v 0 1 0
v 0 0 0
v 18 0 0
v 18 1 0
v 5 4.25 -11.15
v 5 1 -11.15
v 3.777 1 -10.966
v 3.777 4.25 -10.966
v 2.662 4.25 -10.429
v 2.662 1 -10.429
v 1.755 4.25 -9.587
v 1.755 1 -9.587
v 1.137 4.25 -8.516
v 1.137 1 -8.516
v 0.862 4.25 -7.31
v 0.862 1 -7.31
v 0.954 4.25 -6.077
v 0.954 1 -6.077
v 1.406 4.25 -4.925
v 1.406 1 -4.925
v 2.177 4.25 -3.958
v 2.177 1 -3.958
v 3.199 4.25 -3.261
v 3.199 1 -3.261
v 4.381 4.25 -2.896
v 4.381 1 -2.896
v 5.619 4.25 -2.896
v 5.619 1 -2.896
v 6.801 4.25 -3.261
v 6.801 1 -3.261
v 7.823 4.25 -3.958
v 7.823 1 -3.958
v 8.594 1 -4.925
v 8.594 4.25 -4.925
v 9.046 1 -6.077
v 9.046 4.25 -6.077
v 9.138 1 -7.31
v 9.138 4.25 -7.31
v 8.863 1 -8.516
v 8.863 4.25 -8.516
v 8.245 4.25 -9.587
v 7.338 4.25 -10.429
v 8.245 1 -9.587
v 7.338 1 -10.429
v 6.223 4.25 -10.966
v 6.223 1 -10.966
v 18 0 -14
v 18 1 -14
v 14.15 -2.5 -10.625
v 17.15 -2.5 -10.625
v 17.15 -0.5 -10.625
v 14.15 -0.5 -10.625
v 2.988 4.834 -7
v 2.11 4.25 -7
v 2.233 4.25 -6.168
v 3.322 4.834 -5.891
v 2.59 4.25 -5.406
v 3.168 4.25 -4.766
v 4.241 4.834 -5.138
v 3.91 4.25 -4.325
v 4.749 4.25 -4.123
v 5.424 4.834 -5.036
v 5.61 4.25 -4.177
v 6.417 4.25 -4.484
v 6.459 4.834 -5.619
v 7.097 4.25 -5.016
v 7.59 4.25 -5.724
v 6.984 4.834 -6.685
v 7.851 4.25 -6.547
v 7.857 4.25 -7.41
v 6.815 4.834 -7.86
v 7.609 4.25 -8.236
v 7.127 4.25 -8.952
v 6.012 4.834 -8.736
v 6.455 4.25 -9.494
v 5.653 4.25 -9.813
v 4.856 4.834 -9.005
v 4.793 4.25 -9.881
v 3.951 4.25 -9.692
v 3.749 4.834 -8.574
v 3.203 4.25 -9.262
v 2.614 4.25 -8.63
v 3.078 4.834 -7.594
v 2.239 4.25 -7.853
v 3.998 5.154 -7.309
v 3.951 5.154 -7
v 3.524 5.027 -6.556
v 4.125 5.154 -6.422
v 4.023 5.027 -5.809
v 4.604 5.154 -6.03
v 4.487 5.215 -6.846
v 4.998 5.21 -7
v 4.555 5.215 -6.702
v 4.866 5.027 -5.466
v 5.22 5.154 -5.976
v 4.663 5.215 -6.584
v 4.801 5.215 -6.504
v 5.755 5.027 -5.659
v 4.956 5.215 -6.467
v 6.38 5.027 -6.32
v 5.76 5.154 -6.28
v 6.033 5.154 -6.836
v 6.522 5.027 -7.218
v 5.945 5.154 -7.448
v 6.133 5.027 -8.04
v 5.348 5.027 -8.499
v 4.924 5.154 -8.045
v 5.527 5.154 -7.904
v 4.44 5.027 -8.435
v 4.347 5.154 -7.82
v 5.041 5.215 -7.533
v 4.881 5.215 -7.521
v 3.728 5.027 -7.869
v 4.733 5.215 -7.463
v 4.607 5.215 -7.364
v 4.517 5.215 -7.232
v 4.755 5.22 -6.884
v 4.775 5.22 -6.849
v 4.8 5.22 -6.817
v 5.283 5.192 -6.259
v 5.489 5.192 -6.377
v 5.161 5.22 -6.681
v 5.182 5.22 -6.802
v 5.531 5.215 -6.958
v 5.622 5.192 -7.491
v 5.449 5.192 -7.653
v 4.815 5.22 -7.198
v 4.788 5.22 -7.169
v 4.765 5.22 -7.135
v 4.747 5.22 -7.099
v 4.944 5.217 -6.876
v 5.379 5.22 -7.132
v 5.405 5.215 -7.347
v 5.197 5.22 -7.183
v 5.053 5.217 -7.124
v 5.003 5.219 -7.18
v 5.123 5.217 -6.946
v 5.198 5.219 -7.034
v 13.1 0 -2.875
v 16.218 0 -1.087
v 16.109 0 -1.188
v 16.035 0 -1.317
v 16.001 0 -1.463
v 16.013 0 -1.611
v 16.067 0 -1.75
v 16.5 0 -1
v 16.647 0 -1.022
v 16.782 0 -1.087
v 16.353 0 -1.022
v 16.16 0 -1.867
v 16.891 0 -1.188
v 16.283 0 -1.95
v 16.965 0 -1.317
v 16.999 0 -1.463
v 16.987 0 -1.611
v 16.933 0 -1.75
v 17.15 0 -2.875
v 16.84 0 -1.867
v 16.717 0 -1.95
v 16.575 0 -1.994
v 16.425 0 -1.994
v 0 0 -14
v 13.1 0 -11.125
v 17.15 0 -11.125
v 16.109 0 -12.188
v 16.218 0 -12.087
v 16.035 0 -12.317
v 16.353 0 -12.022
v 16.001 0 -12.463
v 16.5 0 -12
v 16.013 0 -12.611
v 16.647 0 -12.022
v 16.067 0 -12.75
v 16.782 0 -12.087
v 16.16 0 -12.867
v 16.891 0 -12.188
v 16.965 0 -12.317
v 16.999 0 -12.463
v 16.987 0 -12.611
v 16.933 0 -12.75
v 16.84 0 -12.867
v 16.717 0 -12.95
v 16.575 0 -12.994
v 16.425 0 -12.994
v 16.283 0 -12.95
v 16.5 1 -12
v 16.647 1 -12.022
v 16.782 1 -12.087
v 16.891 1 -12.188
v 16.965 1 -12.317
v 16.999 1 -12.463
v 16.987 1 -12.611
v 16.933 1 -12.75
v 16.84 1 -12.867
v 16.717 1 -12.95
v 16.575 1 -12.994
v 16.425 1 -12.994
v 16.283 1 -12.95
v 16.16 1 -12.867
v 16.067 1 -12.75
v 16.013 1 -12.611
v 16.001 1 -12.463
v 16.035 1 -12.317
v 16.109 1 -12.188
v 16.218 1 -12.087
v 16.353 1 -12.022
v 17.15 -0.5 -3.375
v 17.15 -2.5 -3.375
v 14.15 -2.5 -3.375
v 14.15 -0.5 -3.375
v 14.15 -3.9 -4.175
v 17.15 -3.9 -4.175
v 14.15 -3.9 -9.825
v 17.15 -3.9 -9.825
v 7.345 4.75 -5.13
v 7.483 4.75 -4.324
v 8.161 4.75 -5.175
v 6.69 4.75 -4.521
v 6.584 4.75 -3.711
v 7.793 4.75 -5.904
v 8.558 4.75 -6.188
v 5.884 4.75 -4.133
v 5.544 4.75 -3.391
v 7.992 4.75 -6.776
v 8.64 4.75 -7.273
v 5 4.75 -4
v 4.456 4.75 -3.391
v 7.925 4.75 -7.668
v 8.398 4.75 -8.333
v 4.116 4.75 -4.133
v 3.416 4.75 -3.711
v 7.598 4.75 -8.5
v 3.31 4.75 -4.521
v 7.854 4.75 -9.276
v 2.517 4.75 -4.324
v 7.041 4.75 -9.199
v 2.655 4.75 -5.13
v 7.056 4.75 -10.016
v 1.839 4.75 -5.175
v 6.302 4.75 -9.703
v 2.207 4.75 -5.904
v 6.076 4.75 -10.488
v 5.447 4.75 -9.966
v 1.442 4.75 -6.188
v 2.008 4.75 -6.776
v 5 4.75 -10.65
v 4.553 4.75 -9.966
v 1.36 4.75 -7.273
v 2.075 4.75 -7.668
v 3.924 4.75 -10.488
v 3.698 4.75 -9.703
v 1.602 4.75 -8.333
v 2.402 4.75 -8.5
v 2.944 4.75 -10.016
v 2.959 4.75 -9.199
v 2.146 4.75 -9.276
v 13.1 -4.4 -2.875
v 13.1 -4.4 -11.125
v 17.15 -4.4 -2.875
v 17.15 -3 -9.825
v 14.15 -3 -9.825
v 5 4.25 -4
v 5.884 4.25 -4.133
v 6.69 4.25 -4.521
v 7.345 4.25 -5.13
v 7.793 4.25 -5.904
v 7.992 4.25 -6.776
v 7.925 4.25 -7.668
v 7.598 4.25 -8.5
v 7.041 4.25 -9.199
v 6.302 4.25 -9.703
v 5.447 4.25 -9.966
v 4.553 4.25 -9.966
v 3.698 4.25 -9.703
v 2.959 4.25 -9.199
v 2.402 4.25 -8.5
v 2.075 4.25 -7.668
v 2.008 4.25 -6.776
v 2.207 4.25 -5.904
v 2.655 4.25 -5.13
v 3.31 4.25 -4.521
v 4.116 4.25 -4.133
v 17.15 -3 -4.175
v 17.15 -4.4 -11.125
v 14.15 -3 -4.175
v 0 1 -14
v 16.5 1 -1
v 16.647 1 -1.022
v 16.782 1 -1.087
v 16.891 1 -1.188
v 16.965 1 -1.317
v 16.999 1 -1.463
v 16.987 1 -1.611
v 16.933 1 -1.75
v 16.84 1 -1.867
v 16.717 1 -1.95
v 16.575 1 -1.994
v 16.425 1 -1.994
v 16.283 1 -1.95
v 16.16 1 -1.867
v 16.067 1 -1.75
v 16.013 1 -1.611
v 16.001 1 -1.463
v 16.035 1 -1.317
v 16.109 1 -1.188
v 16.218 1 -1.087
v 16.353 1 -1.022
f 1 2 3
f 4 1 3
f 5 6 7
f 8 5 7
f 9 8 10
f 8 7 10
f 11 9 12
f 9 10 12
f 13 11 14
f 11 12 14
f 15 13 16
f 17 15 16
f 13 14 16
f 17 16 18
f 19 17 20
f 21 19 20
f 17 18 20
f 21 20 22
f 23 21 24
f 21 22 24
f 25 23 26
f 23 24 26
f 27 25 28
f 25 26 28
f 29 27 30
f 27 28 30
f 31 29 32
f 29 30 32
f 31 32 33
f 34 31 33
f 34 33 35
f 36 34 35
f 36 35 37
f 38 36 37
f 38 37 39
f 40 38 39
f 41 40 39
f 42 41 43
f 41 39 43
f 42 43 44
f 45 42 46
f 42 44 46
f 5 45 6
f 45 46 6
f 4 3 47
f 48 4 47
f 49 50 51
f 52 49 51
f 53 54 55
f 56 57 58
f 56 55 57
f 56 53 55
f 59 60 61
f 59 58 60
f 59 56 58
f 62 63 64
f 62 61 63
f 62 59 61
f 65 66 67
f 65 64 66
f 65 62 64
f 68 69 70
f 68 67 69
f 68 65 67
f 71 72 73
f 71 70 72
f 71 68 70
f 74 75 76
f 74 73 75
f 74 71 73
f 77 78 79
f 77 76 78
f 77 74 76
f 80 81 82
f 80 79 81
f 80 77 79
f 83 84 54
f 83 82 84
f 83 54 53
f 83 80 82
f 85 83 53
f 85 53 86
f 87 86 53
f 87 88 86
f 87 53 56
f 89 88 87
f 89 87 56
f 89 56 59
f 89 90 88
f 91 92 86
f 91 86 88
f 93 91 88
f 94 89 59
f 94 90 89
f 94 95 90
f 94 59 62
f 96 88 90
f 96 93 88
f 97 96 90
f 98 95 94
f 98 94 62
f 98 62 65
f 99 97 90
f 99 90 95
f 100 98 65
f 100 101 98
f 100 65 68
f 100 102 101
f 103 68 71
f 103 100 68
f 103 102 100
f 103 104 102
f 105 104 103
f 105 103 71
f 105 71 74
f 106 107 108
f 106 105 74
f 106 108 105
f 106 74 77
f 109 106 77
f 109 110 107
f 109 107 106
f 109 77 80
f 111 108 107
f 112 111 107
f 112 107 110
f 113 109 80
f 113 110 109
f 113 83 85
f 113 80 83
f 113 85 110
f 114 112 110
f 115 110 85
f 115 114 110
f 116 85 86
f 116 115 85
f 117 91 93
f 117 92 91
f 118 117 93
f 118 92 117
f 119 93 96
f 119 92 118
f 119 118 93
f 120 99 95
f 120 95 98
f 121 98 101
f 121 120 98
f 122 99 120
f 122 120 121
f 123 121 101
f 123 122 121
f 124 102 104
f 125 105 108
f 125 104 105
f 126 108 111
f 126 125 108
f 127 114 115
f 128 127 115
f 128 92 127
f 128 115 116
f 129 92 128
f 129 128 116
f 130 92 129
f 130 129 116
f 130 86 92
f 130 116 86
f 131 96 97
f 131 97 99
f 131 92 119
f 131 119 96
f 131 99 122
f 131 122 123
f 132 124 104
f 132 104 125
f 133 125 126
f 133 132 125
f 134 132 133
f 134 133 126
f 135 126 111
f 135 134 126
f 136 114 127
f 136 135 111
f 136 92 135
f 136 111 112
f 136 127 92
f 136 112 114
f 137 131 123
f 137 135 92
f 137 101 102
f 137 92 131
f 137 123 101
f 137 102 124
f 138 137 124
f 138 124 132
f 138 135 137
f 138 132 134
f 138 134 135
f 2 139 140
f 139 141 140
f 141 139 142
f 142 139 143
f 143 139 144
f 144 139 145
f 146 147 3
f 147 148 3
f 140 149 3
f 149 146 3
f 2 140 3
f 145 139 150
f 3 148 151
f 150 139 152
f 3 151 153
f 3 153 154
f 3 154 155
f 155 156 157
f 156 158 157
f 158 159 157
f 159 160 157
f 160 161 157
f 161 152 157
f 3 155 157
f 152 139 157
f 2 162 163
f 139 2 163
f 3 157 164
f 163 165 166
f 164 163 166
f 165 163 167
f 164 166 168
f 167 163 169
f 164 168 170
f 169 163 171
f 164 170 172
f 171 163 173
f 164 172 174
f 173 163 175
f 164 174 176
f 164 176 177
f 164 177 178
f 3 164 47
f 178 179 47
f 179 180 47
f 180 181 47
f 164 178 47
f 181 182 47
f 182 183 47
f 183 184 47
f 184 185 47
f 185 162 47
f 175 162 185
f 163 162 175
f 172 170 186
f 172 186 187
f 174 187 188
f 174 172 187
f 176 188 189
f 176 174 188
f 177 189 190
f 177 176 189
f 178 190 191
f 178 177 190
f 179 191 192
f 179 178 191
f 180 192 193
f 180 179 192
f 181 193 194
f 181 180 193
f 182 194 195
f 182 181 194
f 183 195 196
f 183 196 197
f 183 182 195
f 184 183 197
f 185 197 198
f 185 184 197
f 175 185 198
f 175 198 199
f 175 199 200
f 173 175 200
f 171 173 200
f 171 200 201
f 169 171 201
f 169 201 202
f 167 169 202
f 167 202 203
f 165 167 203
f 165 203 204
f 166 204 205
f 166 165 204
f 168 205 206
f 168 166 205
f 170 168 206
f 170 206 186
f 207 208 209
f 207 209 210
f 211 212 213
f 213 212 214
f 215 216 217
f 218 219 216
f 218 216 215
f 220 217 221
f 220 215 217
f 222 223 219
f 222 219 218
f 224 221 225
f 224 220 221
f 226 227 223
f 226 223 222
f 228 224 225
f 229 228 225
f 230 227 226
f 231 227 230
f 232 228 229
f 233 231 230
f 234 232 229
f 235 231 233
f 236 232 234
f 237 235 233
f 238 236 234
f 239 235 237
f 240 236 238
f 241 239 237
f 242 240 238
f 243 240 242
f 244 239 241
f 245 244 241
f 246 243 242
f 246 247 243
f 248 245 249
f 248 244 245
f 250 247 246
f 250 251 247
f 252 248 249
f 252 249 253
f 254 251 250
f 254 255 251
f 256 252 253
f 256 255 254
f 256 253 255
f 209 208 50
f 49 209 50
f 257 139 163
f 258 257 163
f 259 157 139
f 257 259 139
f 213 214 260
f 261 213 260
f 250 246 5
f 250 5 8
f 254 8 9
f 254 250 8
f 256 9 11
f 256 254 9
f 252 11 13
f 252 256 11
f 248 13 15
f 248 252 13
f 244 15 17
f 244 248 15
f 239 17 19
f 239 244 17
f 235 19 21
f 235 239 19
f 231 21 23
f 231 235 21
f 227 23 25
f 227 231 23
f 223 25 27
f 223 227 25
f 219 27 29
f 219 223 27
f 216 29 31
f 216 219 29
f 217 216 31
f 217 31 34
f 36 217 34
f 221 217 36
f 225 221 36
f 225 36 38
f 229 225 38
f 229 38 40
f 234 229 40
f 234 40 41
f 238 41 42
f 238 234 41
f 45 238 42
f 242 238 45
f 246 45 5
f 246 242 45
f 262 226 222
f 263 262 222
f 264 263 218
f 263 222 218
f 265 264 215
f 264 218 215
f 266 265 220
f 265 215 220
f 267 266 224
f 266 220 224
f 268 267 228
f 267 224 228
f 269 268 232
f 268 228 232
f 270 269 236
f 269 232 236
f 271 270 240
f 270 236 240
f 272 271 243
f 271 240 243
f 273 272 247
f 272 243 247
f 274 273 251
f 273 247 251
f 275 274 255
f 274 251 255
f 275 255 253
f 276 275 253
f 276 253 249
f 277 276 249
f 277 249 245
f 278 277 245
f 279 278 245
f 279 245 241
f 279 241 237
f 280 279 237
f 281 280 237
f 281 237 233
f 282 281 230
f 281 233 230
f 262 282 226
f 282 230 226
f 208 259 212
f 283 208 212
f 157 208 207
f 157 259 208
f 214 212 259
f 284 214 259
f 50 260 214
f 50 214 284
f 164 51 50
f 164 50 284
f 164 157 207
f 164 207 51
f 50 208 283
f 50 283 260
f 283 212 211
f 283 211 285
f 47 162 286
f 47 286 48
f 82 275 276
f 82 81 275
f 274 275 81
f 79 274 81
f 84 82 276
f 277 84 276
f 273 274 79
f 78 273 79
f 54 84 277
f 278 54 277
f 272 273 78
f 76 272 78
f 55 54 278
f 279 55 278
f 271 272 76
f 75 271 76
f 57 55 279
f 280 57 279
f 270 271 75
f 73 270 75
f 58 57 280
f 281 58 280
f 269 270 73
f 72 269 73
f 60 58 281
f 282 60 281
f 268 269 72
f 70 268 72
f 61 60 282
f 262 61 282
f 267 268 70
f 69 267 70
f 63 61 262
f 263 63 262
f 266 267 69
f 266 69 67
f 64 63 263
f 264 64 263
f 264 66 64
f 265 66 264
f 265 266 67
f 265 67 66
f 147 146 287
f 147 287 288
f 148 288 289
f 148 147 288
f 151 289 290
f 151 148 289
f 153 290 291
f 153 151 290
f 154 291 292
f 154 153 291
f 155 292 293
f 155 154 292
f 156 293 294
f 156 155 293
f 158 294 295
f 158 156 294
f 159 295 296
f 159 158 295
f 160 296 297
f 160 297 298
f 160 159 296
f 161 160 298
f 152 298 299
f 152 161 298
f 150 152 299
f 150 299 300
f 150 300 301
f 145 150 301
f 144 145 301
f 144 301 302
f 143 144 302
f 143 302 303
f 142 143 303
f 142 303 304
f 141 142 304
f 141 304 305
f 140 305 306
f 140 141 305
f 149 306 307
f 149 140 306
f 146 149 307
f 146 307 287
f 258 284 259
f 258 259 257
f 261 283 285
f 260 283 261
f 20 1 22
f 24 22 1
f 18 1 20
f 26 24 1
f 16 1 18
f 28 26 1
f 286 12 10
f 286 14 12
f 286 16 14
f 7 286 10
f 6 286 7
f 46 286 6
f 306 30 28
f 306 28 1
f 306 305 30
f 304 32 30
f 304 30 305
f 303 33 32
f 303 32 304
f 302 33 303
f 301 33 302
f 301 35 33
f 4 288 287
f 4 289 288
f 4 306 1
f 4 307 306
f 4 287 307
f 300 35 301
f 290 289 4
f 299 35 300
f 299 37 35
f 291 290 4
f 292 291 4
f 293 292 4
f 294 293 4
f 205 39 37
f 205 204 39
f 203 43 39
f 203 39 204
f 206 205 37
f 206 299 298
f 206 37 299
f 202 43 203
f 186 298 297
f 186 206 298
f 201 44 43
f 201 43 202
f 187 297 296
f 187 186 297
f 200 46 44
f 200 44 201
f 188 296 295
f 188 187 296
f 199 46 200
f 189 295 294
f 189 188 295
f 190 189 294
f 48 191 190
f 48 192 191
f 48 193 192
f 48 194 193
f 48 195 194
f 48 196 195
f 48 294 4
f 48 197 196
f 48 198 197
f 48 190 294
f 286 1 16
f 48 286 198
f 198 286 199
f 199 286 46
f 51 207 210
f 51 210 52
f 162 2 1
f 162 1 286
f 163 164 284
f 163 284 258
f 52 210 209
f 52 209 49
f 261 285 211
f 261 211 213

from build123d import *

# Parameters (mm, degrees)
SKETCH1_W           = 18
SKETCH1_H           = 14
SKETCH1_R           = 0.5
BOSS_EXTRUDE1_DEPTH = 1
SKETCH2_R           = 4.15
BOSS_EXTRUDE2_DEPTH = 3.75
SKETCH3_W           = 4.05
SKETCH3_H           = 8.25
BOSS_EXTRUDE3_DEPTH = 4.4
SKETCH4_W           = 7.25
SKETCH4_H           = 2
SKETCH4_W_2         = 5.65
SKETCH4_H_2         = 0.9
CUT_EXTRUDE1_DEPTH  = 3
SKETCH5_R           = 3
CUT_EXTRUDE2_DEPTH  = 0.5
CHAMFER1_SIZE       = 0.5


with BuildPart() as part:
    # Sketch1 → Boss-Extrude1 (new body)
    with BuildSketch(Plane(origin=(0, 0, 0), x_dir=(1, 0, 0), z_dir=(0, 1, 0))):
        with Locations((9, 7)):
            Rectangle(SKETCH1_W, SKETCH1_H)
        with Locations(Location((16.5, 12.5, 0), (0, 0, 270))):
            Circle(SKETCH1_R, mode=Mode.SUBTRACT)
        with Locations(Location((16.5, 1.5, 0), (0, 0, 270))):
            Circle(SKETCH1_R, mode=Mode.SUBTRACT)
    extrude(amount=BOSS_EXTRUDE1_DEPTH)

    # Sketch2 → Boss-Extrude2 (add)
    with BuildSketch(Plane(origin=(0, 1, 0), x_dir=(1, 0, 0), z_dir=(0, 1, 0))):
        with Locations(Location((5, 7, 0), (0, 0, 90))):
            Circle(SKETCH2_R)
    extrude(amount=BOSS_EXTRUDE2_DEPTH)

    # Sketch3 → Boss-Extrude3 (add)
    with BuildSketch(Plane(origin=(0, 0, 0), x_dir=(-1, 0, 0), z_dir=(0, -1, 0))):
        with Locations((-15.125, 7)):
            Rectangle(SKETCH3_W, SKETCH3_H)
    extrude(amount=BOSS_EXTRUDE3_DEPTH)

    # Sketch4 → Cut-Extrude1 (cut)
    with BuildSketch(Plane(origin=(17.15, 0, 0), x_dir=(0, 0, -1), z_dir=(1, 0, 0))):
        with Locations((7, -1.5)):
            Rectangle(SKETCH4_W, SKETCH4_H)
        with Locations((7, -3.45)):
            Rectangle(SKETCH4_W_2, SKETCH4_H_2)
    extrude(amount=-CUT_EXTRUDE1_DEPTH, mode=Mode.SUBTRACT)

    # Sketch5 → Cut-Extrude2 (cut)
    with BuildSketch(Plane(origin=(0, 4.75, 0), x_dir=(1, 0, 0), z_dir=(0, 1, 0))):
        with Locations(Location((5, 7, 0), (0, 0, 270))):
            Circle(SKETCH5_R)
    extrude(amount=-CUT_EXTRUDE2_DEPTH, mode=Mode.SUBTRACT)

    # Chamfer1
    chamfer1_edges = [part.edges().sort_by_distance(p)[0] for p in [
        (5, 4.75, -2.85),
    ]]
    chamfer(chamfer1_edges, length=CHAMFER1_SIZE)

    # Sketch7 → Revolve2 (revolve)
    with BuildSketch(Plane.XY.offset(-7)):
        with BuildLine():
            add(Edge.make_bspline(
                [(2.090335023, 4.232825991), (3.350844408, 5.324759463), (4.998474219, 5.209553412)],
                knots=[0, 0, 0, 1, 1, 1], degree=2))
            Line((4.998474219, 5.209553412), (4.998474219, 4.232825991))
            Line((4.998474219, 4.232825991), (2.090335023, 4.232825991))
        make_face()
    revolve(axis=Axis((4.998474219, 4.232825991, -7), (0, 1, 0)))


solid = part.part
